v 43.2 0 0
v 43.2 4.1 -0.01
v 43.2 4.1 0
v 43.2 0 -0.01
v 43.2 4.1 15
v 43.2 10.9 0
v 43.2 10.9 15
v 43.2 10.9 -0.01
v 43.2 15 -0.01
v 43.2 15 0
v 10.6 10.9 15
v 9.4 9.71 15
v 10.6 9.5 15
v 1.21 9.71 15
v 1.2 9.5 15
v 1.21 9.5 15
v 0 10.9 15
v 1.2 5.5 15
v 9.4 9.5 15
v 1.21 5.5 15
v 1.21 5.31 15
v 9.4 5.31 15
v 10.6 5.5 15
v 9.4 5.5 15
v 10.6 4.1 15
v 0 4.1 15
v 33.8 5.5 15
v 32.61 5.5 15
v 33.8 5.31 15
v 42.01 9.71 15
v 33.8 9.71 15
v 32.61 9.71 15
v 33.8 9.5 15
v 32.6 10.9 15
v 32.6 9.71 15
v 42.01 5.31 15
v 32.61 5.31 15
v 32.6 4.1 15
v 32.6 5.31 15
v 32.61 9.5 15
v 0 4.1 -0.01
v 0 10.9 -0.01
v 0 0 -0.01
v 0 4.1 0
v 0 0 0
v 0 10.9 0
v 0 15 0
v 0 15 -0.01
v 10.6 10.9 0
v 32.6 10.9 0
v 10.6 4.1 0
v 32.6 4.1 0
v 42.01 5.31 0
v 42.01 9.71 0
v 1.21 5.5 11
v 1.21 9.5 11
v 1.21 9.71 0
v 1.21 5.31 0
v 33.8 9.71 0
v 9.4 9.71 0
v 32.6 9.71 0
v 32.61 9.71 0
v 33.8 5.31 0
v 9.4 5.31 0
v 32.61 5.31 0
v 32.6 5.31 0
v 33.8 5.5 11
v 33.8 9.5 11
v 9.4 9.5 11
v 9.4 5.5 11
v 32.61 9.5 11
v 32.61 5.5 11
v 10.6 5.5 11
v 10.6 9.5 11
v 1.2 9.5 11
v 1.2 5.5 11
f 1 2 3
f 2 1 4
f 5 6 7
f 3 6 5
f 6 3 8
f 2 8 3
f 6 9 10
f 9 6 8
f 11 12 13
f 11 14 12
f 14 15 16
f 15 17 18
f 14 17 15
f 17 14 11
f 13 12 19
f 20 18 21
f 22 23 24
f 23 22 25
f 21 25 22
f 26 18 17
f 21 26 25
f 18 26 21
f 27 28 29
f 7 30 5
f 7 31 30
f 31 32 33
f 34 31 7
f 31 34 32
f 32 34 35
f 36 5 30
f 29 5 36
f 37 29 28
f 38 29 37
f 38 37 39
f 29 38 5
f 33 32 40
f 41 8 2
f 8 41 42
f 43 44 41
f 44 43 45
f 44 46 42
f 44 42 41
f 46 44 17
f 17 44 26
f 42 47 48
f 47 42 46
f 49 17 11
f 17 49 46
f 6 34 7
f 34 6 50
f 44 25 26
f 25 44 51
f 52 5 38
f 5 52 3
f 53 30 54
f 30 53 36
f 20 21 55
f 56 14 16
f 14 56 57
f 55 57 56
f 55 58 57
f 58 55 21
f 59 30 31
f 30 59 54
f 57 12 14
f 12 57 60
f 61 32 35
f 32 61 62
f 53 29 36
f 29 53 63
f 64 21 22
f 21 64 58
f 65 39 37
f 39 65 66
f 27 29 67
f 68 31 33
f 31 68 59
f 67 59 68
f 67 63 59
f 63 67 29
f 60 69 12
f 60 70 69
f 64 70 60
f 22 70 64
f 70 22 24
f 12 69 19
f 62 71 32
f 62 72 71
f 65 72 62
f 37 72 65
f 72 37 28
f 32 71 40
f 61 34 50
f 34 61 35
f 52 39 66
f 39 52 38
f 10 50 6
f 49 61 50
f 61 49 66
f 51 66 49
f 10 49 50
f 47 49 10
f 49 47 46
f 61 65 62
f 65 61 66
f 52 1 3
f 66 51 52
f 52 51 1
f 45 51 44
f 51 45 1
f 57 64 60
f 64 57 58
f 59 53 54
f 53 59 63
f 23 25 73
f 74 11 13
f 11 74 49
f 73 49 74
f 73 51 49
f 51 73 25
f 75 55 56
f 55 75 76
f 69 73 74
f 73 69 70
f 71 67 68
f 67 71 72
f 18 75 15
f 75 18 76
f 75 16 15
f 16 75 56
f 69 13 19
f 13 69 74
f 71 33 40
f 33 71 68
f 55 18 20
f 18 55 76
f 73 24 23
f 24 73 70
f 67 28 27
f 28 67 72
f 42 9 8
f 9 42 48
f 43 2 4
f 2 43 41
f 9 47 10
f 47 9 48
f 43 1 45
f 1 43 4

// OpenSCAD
// file: ../Base/PlacementOptions.scad
// Fischertechnik Box Foundation
// Placement Options

// Alignment
NoAlign = 0;
AlignLeft = 1;
AlignBottom = 2;
AlignCenter = 3;
AlignRight = 4;
AlignTop = 5;

// Element rotation degree steps
rotations = [0, -90, -180, -270];

// Rotation
NoRotation = 0;
Rotate0 = 0;
Rotate90 = 1;
Rotate180 = 2;
Rotate270 = 3;

// Docking (seen from above)
NoDock = -1;
DockLeft = 0;
DockTop = 1;
DockRight = 2;
DockCorner = 2;
DockBottom = 3;

// Web corners
LowerLeft = 0;
UpperLeft = 1;
UpperRight = 2;
LowerRight = 3;

// Web position relative to corner
LeftOfCorner = 0;
RightOfCorner = 1;
// file: ../Base/Boxes.scad
// Fischertechnik Box Foundation
// Pre-designed Boxes

use <Constants.scad>

include <PlacementOptions.scad>

box190Width = 190;
box190Depth = 130;
box130Width = 130;
box130Depth = 95;

// Values are from an original ec3 box
topBottomDifference = 1.5;
outerHeight = 40;
baseThickness = 1.8;
innerHeight = outerHeight - baseThickness;
stackExcess = 5.7;
radius = 3.5;
wallThickness = 1.5;
tolerance = 0.2;

boxWallThickness = wallThickness;
boxBaseThickness = baseThickness;
boxWebWidth = 3.0;

// getBoxWallThickness()
// Gets the wall thickness of a Fischertechnik Box
function getBoxWallThickness() = boxWallThickness;

// getBoxUsageHeight(height = 38.2)
// Gets the usable height of a Fischertechnik box
// height = Outer height of the box from the bottom to the upper edge.
function getBoxUsageHeight(height = outerHeight) = height - baseThickness - stackExcess;

// getBoxInnerHeight()
// Gets the inner height of a Fischertechnik box, including the stack excess
function getBoxInnerHeight() = innerHeight;

// getBoxBaseThickness()
// Gets the thickness of the Fischertechnik box base.
function getBoxBaseThickness() = boxBaseThickness;

// getBoxWebWidth()
// Gets the width of a box web
function getBoxWebWidth() = boxWebWidth;

// getBox190Space()
// Gets the usable inner space of a Box 190 as an x/y-list
function getBox190Space() = [
    box190Width - 2*getBoxWallThickness() - topBottomDifference, 
    box190Depth - 2*getBoxWallThickness() - topBottomDifference ];

// RoundedCornerPlate(width, depth, height, radius)
// Creates a body plate with rounded corners for a box. Used
// also to create the complete box with the hull module.
// width = Width of the plate
// depth = depth of the plate 
// height = thickness of the plate
// radius = radius of the rounded corner
module RoundedCornerPlate(width, depth, height, radius) {
    translate([radius, radius])
    hull() {
        w = width-2*radius;
        d = depth-2*radius;
        cube([w, d, height]);
        cylinder(height, r=radius, $fn=getFragments());
        translate([w, 0])
            cylinder(height, r=radius, $fn=getFragments());
        translate([w, d])
            cylinder(height, r=radius, $fn=getFragments());
        translate([0, d])
            cylinder(height, r=radius, $fn=getFragments());
    }
}

// BoxBase(width, depth)
// Creates an empty stackable Fischertechnik compatible box
// width = Outer width of the box (190, 130, ...)
// depth = Outer depth of the box (130, 95, ...)

module BoxBase(width, depth, height=outerHeight) {    
    thinPlate = 0.01;

    innerHeight = height - baseThickness;    
    
    module Body(tolerance=tolerance) {
        hull() {
            // Bottom with tolerance to fit into the original boxes when stacked
            translate([-wallThickness+tolerance, -wallThickness+tolerance, -baseThickness])
                RoundedCornerPlate(width-topBottomDifference-2*tolerance, depth-topBottomDifference-2*tolerance, thinPlate, radius);
            
            // Top
            translate([-wallThickness-topBottomDifference/2, -wallThickness-topBottomDifference/2, innerHeight-thinPlate])
                RoundedCornerPlate(width, depth, thinPlate, radius);
         }
    }

    module Cutoff() {
        hull() {
            coWidth = width - 2*wallThickness;
            coDepth = depth - 2*wallThickness;
            
            // Bottom
            RoundedCornerPlate(coWidth-topBottomDifference, coDepth-topBottomDifference, thinPlate, radius);

            // Top
            translate([-topBottomDifference/2, -topBottomDifference/2, innerHeight+thinPlate]) 
                RoundedCornerPlate(coWidth, coDepth, thinPlate, radius);
        }
    }
    
    difference() {        
        Body();
        Cutoff();
        stackOffset = innerHeight - stackExcess;
        translate([0, 0, stackOffset + baseThickness])
            Body(tolerance=0);
    }
}

// Creates the Fischertechnik empty box 130x190 mm and places it at position 0,0
// 190x130 are the outer sizes, the inner space is slightly smaller. Use getBox190Space() to get the inner sizes.
// The box is positioned that the usable inner space is at the 0,0,0 position.

module Box190() {
    BoxBase(box190Width, box190Depth);
}

// Gets the usable inner space of a Box 130 as an x/y-list
function getBox130Space() = [
    box130Width - 2*getBoxWallThickness() - topBottomDifference, 
    box130Depth - 2*getBoxWallThickness() - topBottomDifference ];

// Creates the Fischertechnik empty box 95x130 mm and places it at position 0,0
// 190x130 are the outer sizes, the inner space is slightly smaller. Use getBox190Space() to get the inner sizes.
// The box is positioned that the usable inner space is at the 0,0,0 position.

module Box130() {
    BoxBase(box130Width, box130Depth);
}

// Creates a web at the specified box walls
// corner 0 = LowerLeft, 1 = UpperLeft, 2 = UpperRight, 3 = LowerRight
// side 0 = LeftOfCorner, 1 = RightOfCorner
// distance = Distance in mm from the corner
// boxSpace = inner width and depth of the box (default: Box 190)
// webWidth = length of the web (default is 3 mms)
// webThickness = thickness of the web (default is 1 mm)
// height = Height of the web (standard is getBoxUsageHeight())

module BoxWeb(corner, side, distance, boxSpace=getBox190Space(), webWidth=getBoxWebWidth(), webThickness=1.0, height=getBoxUsageHeight()) {
    sink = getBoxWallThickness()/2;

    width = (corner % 2 == 0) ? 
            (side == LeftOfCorner ? webWidth : webThickness) :
            (side == LeftOfCorner ? webThickness : webWidth);

    depth = (corner % 2 == 0) ? 
            (side == RightOfCorner ? webWidth : webThickness) :
            (side == RightOfCorner ? webThickness : webWidth);
    
    xDiff = corner == LowerLeft ? 
                (side == LeftOfCorner ? -sink : distance) :
            (corner == UpperLeft ?                
                (side == LeftOfCorner ? distance : -sink) :
            (corner == UpperRight ?
                (side == LeftOfCorner ? boxSpace.x-webWidth+sink : boxSpace.x-distance-webThickness) :
                (side == LeftOfCorner ? boxSpace.x-distance-webThickness: boxSpace.x-webWidth+sink)));

    yDiff = corner == LowerLeft ? 
                (side == RightOfCorner ? -sink : distance) :
            (corner == UpperLeft ?
                (side == RightOfCorner ? boxSpace.y-distance-webThickness : boxSpace.y-webWidth+sink) :
            (corner == UpperRight ?
                (side == RightOfCorner ? boxSpace.y-webWidth+sink : boxSpace.y-distance-webThickness) :
                (side == RightOfCorner ? distance : -sink)));
    
    translate([xDiff, yDiff, -getExcess()])
        cube([width, depth, height + 2*getExcess()]);
}
// file: ../Base/Rotation.scad
// Fischertechnik Box Foundation
// Geometry Helpers Rotation

include <PlacementOptions.scad>

// getRotatedSpace(space, rotation=NoRotation)
// Rotates the space dependent on the specified rotation

function getRotatedSpace(space, rotation=NoRotation) = [
    (rotation == Rotate90 || rotation == Rotate270) ? space.y : space.x,
    (rotation == Rotate90 || rotation == Rotate270) ? space.x : space.y
];

// Rotates the given space around the fixed left lower corner
// space = the space the children needs as width/depth list [width,depth]
// rotation = 0 Rotate0 degrees, 1 Rotate90 degrees, 2 Rotate180 degrees, 3 Rotate270 degrees (equivalent to -90)

module RotateFix(space, rotation=NoRotation) {
    dy = (rotation == Rotate0 || rotation == Rotate270) ? 0 :
        (rotation == Rotate90) ? space.x :
        space.y;
    dx = (rotation < Rotate180) ? 0 :
        (rotation == Rotate180) ? space.x :
        space.y;
    
    translate([dx, dy, 0])
        rotate([0, 0, rotations[rotation]])
            children();
}
// file: ../Base/Alignment.scad
// Fischertechnik Box Foundation
// Geometry Helpers Alignment

include <PlacementOptions.scad>

// getAlignedX(elementWidth, spaceWidth, align=AlignRight, offset=0)
// Gets the aligned X offset of an element with the given
// width in the given space.
// elementWidth = The width of the element to positon
// spaceWidth = The space where the element should be aligned
// align = 0 AlignLeft, 1 AlignCenter, 2 AlignRight
// offset = an optional offset from the aligned position. When
// aligned left or centered, then positive values are in X direction.
// When aligned right then positive values are in negative X direction.

function getAlignedX(elementWidth, spaceWidth, align=AlignRight, offset=0) =
    (align == AlignLeft) ?
        offset :
        ((align == AlignCenter) ?
        (spaceWidth - elementWidth)/2 + offset :
        spaceWidth - offset - elementWidth);

// getAlignedY(elementDepth, spaceDepth, align=AlignTop, offset=0)
// Gets the aligned Y offset of an element with the given
// depth in the given space.
// elementDepth = The depth of the element to positon
// spaceDepth = The space where the element should be aligned
// align = 0 AlignBottom, 1 AlignCenter, 2 AlignTop
// offset = an optional offset from the aligned position. When
// aligned bottom or centered, then positive values are in Y direction.
// When aligned top then positive values are in negative Y direction.

function getAlignedY(elementDepth, spaceDepth, align=AlignTop, offset=0) =
    (align == AlignBottom) ?
        offset :
        ((align == AlignCenter) ?
        (spaceDepth - elementDepth)/2 + offset :
        spaceDepth - offset - elementDepth);
// file: ../Base/Constants.scad
// Fischertechnik Box Foundation
// Constants

// Constant values necessary for multiple elements

// Base constants
dividerThickness = 1.2;
excess = 0.01;
fragments = 90;
tolerance = 0.8;

// Gets the thickness of a divider 
function getDividerThickness() = dividerThickness;

// Gets the excess that is used to merge walls into each other
function getExcess() = excess;

// Gets amount of fragments of a cylinder
function getFragments() = fragments;

// Gets the inner tolerance of a frame to each side
function getTolerance() = tolerance;


// Fischertechnik specific constants
axisDiameter = 4;
axisBottomDiameter = axisDiameter + 1;
axisTolerance = 0.2;

// Gets axis diameter of Fischertechnik axis
function getAxisDiameter() = axisDiameter;

// Gets axis diameter tolerance (subtracted for element axis)
function getAxisTolerance() = axisTolerance;

// Gets the axis diameter for standing axis
function getStandAxisDiameter() = getAxisDiameter() - getAxisTolerance();

// Gets axis bottom diameter for thicker part at the bottom
function getAxisBottomDiameter() = axisBottomDiameter;

standardEdgeDistance = 2.5;
standardWebDistance = 11.5;
standardCornerLength = 15;

// gets the standard distance to the wall of the box for dockable frames with webs
function getStandardEdgeDistance() = standardEdgeDistance;

// gets the standard distance of each web to the corner of the dockable frame
function getStandardWebDistance() = standardWebDistance;

// gets the standard length of the corner walls of a dockable frame
function getStandardCornerLength() = standardCornerLength;

tubeWallFactor = 0.8;

// gets the wall thickness of a tube.
function getTubeWallThickness() = tubeWallFactor * getDividerThickness();

smallPartsFrameHeight = 20;

// gets the frame height for docked small parts boxes.
function getSmallPartsFrameHeight() = smallPartsFrameHeight;

hubRingDiameter = 19.5;
hubRingLevelDiameter = 21;

// gets the diameter of a tube matching the inner ring of a wheel
function getHubRingDiameter() = hubRingDiameter;

// gets the diameter of a hub tube with a thicker diameter
function getHubRingLevelDiameter() = hubRingLevelDiameter;
// file: FrameAxis40.scad
// Fischertechnik Box Library
// Frame for single 40 mm Axis (with Z28)
// 31064

use <../ModelBase/Complex.scad>

length = 40;

// getFrameAxis40Space()
// Gets the width (.x) and depth (.y) of the axis frame.

function getFrameAxis40Space() = getFrameAxisSpace(length);

// FrameAxis40()
// Axis holder for a single 50 mm axis.

module FrameAxis40() {
    FrameAxis(length);
}

// Test
color("lightgray")
FrameAxis40();
// file: ../Base/Placement.scad
// Fischertechnik Box Foundation
// Geometry Helpers Placement

use <Constants.scad>
use <Alignment.scad>
use <Rotation.scad>
use <Boxes.scad>

include <PlacementOptions.scad>

// Place(x=0, y=0, elementSpace=[0,0], alignX=AlignLeft, alignY=AlignBottom, rotation=Rotate0, boxSpace=getBox190Space())
// Places the child at the specified position
// y = Y-Position. This is a relative position when an X aligment is specified.
// x = X-Position. This is a relative position when an Y aligment is specified.
// elementSpace = space of the element to be placed [x,y]
// alignX = -1=NoAlign, 0 AlignLeft, 1 AlignCenter, 3 AlignRight (elementSpace and boxSpace required!)
// alignY = -1=NoAlign, 2 AlignBottom, 1 AlignCenter, 4 AlignTop (elementSpace and boxSpace required!)
// rotation = 0 Rotate0 0 degrees, 1 Rotate90 90 degrees, 
// 2 Rotate180 180 degrees, 3 Rotate270 270 degrees (equivalent to -90)
// boxSpace = Inner space of the box where the placement occurs [x,y] - default is Box 190x130 inner space

module Place(x=0, y=0, elementSpace=[0,0], 
  alignX=AlignLeft, alignY=AlignBottom, 
  rotation=NoRotation, boxSpace=getBox190Space()) {

    module Position(x, y, space, rotation=Rotate0) {
        translate([x, y, 0])
            RotateFix(space, rotation)
                children();
    }

    space = getRotatedSpace(elementSpace, rotation);
    alignedX = getAlignedX(space.x, boxSpace.x, alignX, x);
    alignedY = getAlignedY(space.y, boxSpace.y, alignY, y);
    Position(alignedX, alignedY, elementSpace, rotation)
        children();
}

// Center(space=getBox130Space(), elementSpace=[0,0])
// space = Space where the children is centered. For cylinder use centered=true and no elementSpace.
// elementSpace = space of the element to be centered [x,y]

module Center(space=getBox190Space(), elementSpace=[0,0]) {
    Place(elementSpace=elementSpace, boxSpace=space, alignX=AlignCenter, alignY=AlignCenter)
        children();
}

// CenterHorizontal(width=0, y=0, offset=0, space=getBox130Space())
// width = Width of the element to be placed.
// y = Y position of the element
// offset = Offset from the center position (negative will be left of the center)
// space = Space where the element is placed

module CenterHorizontal(width=0, y=0, offset=0, space=getBox190Space()) {
    Place(x=offset, y=y, elementSpace=[width, 0], boxSpace=space, alignX=AlignCenter)
        children(0);
}

// CenterVertical(depth=0, x=0, offset=0, space=getBox130Space())
// depth = Depth of the element to be placed.
// x = X position of the element
// offset = Offset from the center position (negative will be down of the center)
// space = Space where the element is placed

module CenterVertical(depth=0, x=0, offset=0, space=getBox190Space()) {
    Place(x=x, y=offset, elementSpace=[0, depth], boxSpace=space, alignY=AlignCenter)
        children(0);
}

// getIsVertical(align)
// True if the specified alignment needs a vertical orientation for a divider (AlignRight, AlignLeft)

function getIsVertical(align) = (align == AlignRight || align == AlignLeft);

// getIsHorizontal(align)
// True if the specified alignment needs a horizontal orientation for a divider (AlignTop, AlignBottom)

function getIsHorizontal(align) = (align == AlignTop || align == AlignBottom);
// main file
// Fischertechnik Box Library
// Frame for 40 mm Axis with gear wheel 28
// 31064

use <../Base/Placement.scad>
use <../ModelBase/Simple.scad>
use <FrameAxis40.scad>

/* [Hidden] */
depth = 15;

// getFrameAxis40WithGearwheelZ28Space()
// Gets the width (.x) and depth (.y) of the axis frame.

function getFrameAxis40WithGearwheelZ28Space() = 
[
    getFrameAxis40Space().x,
    depth
];

// FrameAxis40WithGearwheelZ28()
// Axis holder for a 40 mm axis with gear wheel Z28.

module FrameAxis40WithGearwheelZ28() {
    Space(getFrameAxis40WithGearwheelZ28Space());
    CenterVertical(depth=getFrameAxis40Space().y, space=getFrameAxis40WithGearwheelZ28Space())
        FrameAxis40();
}

// Test
color("lightgray")
FrameAxis40WithGearwheelZ28();
